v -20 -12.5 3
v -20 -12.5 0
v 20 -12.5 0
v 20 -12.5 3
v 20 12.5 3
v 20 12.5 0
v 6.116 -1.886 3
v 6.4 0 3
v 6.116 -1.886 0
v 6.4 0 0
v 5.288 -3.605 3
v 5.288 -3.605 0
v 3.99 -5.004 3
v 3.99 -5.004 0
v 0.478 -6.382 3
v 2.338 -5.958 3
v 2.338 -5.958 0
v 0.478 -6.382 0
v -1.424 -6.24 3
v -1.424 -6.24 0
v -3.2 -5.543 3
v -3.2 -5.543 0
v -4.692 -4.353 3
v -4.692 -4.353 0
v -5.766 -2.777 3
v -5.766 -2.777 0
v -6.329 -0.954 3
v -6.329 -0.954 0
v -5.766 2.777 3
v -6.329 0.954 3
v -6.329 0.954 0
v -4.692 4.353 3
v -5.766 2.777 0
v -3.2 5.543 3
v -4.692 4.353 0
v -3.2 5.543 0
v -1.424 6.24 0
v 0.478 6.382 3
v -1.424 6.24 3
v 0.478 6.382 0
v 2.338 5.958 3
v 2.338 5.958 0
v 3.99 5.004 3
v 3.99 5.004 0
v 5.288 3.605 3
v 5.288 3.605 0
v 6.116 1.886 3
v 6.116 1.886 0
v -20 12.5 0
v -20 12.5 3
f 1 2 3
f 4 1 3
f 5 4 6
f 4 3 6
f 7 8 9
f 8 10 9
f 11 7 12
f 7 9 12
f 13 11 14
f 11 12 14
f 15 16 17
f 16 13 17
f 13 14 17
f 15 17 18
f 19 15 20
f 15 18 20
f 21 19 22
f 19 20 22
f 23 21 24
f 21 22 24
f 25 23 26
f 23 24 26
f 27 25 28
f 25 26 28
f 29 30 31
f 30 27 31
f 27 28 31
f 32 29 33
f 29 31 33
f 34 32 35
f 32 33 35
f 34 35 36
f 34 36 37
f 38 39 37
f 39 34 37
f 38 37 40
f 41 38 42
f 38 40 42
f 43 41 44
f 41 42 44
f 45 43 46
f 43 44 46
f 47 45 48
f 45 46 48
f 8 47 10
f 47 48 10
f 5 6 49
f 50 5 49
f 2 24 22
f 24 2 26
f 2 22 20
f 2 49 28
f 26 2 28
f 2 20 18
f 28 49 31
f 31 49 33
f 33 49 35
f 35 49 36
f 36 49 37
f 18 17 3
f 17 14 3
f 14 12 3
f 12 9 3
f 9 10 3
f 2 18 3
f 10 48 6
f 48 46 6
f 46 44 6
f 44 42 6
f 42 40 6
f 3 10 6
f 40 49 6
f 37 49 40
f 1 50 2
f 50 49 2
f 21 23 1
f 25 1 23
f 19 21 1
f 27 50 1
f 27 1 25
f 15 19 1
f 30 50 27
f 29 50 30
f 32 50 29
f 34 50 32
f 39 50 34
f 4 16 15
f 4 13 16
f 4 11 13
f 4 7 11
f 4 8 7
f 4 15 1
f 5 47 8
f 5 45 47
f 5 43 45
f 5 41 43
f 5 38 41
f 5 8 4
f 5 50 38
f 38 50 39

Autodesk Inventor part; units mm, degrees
ref_plane "YZ Plane" through (0, 0, 0) normal (1, 0, 0) x (0, 1, 0)
ref_plane "XZ Plane" through (0, 0, 0) normal (0, 1, 0) x (-1, 0, 0)
ref_plane "XY Plane" through (0, 0, 0) normal (0, 0, 1) x (1, 0, 0)
sketch "Sketch1" plane through (0, 0, 0) normal (0, 0, 1) x (1, 0, 0)
  circle A0 centre (0, 0) radius 6.4
  line L0 (-20, -12.5) -> (20, -12.5)
  line L1 (20, -12.5) -> (20, 12.5)
  line L2 (20, 12.5) -> (-20, 12.5)
  line L3 (-20, 12.5) -> (-20, -12.5)
  dimension "d0" = 12.8
  dimension "d1" = 20
  dimension "d2" = 40
  dimension "d3" = 25
  dimension "d4" = 12.5
extrude "Extrusion1" add sketch "Sketch1" along normal blind 3
equation "\"d1\" = 0.5 * d2"
equation "\"d4\" = 0.5 * d3"
properties part number "314-07" material "Steel"
